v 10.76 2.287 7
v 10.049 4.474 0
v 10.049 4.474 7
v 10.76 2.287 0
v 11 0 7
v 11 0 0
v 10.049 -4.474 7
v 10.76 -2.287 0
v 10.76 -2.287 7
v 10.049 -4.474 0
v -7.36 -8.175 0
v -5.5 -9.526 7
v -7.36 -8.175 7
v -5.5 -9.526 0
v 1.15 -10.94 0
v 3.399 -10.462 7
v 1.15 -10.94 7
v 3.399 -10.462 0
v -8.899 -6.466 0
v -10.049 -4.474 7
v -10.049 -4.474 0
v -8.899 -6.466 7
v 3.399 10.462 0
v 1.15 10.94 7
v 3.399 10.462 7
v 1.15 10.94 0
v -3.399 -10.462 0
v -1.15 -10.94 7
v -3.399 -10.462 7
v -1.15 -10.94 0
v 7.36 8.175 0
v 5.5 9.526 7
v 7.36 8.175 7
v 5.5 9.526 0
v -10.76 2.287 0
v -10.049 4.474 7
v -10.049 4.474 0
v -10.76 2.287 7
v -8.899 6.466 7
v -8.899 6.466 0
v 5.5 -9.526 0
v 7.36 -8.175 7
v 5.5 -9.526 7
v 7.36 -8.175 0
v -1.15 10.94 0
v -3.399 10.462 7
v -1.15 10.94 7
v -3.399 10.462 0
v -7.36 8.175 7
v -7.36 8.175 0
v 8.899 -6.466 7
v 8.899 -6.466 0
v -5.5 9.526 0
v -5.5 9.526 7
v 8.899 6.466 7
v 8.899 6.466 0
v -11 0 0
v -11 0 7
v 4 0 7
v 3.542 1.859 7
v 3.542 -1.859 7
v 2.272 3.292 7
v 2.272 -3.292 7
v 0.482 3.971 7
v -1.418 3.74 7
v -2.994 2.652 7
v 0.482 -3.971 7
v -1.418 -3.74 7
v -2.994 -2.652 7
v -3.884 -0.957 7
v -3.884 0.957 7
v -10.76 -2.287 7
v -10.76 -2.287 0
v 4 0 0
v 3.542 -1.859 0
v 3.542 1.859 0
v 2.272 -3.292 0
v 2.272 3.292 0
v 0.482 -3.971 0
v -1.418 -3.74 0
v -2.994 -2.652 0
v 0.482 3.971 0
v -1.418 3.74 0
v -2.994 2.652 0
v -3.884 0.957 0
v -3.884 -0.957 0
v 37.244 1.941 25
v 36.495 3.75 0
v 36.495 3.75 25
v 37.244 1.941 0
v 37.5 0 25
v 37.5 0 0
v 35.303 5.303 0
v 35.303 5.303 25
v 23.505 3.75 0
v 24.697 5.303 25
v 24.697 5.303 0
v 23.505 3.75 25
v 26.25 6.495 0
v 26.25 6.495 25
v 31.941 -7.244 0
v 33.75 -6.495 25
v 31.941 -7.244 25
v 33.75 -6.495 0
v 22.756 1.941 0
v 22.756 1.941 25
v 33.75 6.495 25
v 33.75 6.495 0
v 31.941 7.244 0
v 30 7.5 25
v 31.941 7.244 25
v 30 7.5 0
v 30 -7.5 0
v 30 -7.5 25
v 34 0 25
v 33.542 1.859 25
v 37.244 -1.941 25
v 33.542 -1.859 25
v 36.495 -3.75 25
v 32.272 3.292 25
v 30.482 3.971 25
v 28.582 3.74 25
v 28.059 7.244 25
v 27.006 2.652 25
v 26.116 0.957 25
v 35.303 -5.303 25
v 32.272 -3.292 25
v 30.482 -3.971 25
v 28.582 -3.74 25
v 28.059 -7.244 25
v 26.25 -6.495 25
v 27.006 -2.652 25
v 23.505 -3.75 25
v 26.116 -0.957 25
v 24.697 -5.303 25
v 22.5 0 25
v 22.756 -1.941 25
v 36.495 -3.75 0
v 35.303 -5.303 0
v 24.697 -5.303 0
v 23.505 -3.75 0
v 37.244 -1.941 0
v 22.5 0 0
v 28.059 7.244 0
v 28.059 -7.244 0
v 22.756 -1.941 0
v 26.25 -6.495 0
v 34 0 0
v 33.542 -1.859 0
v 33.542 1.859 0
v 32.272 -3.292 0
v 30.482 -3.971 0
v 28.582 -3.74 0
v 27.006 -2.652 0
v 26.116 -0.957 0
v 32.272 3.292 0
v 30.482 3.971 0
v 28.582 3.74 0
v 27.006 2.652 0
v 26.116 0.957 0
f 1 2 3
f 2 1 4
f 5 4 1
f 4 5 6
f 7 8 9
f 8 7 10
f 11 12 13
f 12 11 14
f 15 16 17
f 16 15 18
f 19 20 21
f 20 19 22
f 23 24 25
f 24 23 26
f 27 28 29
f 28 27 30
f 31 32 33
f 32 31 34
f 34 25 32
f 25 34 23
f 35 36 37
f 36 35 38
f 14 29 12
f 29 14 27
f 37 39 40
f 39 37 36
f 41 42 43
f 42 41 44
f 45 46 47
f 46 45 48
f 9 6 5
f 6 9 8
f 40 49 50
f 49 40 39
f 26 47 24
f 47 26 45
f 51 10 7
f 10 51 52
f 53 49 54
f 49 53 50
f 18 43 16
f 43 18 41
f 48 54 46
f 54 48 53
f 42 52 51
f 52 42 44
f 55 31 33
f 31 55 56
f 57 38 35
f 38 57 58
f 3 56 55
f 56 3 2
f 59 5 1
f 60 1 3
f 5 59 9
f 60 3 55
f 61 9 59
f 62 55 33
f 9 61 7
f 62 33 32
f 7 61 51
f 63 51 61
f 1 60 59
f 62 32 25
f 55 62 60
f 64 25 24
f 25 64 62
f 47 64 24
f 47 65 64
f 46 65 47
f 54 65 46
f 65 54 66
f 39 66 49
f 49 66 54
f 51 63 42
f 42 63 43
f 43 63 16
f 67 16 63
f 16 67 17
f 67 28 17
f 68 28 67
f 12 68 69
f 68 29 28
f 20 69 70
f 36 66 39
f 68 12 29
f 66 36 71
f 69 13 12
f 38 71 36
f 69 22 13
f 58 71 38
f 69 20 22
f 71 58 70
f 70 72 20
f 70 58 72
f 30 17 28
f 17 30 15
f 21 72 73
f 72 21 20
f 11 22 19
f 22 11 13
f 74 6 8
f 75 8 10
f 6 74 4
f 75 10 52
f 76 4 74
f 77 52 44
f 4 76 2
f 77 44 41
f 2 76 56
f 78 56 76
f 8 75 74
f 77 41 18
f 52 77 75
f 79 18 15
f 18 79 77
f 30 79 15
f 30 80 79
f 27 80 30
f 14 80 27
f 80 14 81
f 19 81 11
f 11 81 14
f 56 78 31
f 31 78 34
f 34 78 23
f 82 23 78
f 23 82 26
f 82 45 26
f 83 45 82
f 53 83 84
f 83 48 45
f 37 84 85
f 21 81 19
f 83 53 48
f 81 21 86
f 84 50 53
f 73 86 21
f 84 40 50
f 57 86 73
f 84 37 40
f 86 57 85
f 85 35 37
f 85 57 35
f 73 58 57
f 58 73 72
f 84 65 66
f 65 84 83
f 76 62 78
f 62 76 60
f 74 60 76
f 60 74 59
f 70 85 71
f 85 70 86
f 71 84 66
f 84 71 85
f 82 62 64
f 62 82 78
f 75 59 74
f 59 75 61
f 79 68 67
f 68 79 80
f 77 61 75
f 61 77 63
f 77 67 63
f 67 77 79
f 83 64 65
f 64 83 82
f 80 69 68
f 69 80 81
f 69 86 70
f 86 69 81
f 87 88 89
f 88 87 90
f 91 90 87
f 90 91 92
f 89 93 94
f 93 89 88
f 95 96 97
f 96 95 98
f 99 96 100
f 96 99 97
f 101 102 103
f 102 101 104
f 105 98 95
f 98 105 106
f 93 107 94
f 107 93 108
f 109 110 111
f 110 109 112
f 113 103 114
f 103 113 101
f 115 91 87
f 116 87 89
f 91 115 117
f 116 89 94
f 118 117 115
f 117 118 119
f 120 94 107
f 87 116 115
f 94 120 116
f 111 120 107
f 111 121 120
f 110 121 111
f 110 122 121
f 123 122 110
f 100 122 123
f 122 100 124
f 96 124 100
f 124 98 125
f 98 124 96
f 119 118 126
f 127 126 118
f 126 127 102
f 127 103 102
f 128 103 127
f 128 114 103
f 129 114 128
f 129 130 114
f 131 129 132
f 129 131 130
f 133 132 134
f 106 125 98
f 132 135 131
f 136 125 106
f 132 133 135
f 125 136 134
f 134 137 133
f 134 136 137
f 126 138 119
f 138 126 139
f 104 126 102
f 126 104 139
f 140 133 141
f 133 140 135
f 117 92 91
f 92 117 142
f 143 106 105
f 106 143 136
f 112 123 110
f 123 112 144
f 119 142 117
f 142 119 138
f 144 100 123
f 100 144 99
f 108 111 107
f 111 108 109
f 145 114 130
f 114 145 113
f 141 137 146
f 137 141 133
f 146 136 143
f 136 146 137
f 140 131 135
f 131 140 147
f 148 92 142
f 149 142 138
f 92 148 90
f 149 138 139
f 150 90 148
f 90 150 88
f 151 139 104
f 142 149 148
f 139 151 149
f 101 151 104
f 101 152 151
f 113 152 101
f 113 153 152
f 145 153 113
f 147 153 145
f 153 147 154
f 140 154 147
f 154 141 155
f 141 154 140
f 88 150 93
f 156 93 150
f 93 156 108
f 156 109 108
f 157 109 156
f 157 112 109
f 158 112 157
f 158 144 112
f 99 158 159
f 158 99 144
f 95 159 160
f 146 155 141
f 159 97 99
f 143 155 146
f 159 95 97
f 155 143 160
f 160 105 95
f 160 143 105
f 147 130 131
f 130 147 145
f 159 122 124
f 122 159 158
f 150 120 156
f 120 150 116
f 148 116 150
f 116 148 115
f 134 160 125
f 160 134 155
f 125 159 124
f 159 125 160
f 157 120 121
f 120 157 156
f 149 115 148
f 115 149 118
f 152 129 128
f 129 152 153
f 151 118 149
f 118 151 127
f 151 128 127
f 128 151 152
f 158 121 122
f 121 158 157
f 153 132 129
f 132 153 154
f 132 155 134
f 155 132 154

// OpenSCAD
steel = [0.8, 0.8, 0.9];


// Bearing dimensions are [ID, OD, W]
function inside_diameter(size) = size[0];
function outside_diameter(size) = size[1];
function width(size) = size[2];


module bearing(dims) {
    id = dims[0];
    od = dims[1];
    translate([0,0,width(dims)/2])
    color(steel) 
    render()
    difference() {
	cylinder(h=width(dims), r=outside_diameter(dims)/2, center=true);
	cylinder(h=width(dims)*2, r=inside_diameter(dims)/2, center=true);
    }
}


bearing([8, 22, 7]); // 608 skateboard ball bearing.

translate([30, 0, 0]) 
bearing([8, 15, 25]);  // Linear bearing for 8mm smooth rod.
